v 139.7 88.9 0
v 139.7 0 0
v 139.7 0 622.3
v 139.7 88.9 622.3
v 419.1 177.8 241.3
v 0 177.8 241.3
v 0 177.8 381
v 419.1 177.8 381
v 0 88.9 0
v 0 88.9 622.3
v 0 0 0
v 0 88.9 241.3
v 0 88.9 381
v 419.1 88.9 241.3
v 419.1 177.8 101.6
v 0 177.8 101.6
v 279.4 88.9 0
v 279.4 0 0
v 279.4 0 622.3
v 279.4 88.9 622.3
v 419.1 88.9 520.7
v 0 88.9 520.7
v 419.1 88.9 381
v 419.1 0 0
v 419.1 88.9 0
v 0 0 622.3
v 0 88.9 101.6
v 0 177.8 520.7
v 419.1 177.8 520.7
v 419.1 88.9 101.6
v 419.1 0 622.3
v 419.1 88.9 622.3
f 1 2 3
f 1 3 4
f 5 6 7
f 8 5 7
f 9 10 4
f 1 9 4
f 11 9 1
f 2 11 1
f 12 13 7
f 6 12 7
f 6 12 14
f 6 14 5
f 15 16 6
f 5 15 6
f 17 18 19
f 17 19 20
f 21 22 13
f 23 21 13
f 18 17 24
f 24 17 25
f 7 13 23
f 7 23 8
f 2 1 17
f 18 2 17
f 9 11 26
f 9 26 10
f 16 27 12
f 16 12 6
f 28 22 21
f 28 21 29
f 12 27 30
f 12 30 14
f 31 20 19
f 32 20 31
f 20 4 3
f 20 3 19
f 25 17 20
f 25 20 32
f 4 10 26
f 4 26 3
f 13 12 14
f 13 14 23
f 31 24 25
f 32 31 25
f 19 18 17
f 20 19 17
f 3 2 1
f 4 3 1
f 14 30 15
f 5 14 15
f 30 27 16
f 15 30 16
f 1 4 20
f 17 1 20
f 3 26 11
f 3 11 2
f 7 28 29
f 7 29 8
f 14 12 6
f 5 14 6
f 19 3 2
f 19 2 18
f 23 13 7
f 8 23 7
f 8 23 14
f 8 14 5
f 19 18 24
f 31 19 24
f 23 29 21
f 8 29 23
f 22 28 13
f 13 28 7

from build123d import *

# Parameters (mm, degrees)
SKETCH1_W             = 139.7
SKETCH1_H             = 88.9
BOSS_EXTRUDE1_DEPTH   = 622.3
BOSS_EXTRUDE1_2_DEPTH = 622.3
SKETCH1_4_W           = 139.7
SKETCH1_4_H           = 88.9
BOSS_EXTRUDE2_DEPTH   = 622.3
SKETCH2_W             = 139.7
SKETCH2_H             = 88.9
BOSS_EXTRUDE3_DEPTH   = 419.1
LPATTERN1_OUTLINE_W   = 88.9
LPATTERN1_OUTLINE_H   = 139.7
LPATTERN1_DEPTH       = 419.1
LPATTERN1_2_OUTLINE_W = 88.9
LPATTERN1_2_OUTLINE_H = 139.7
LPATTERN1_2_DEPTH     = 419.1


# Read off the part's stored shape, not the designer's step: LPattern1
with BuildPart() as part:
    # Sketch1 → Boss-Extrude1 (new body)
    with BuildSketch(Plane.XY):
        with Locations((69.85, 44.45)):
            Rectangle(SKETCH1_W, SKETCH1_H)
    extrude(amount=BOSS_EXTRUDE1_DEPTH)


with BuildPart() as body_2:
    # Sketch1 → Boss-Extrude1 2 (new body)
    with BuildSketch(Plane.XY):
        with Locations((349.25, 44.45)):
            Rectangle(SKETCH1_W, SKETCH1_H)
    extrude(amount=BOSS_EXTRUDE1_2_DEPTH)


with BuildPart() as body_3:
    # Sketch1<4> → Boss-Extrude2 (new body)
    with BuildSketch(Plane.XY):
        with Locations((209.55, 44.45)):
            Rectangle(SKETCH1_4_W, SKETCH1_4_H)
    extrude(amount=BOSS_EXTRUDE2_DEPTH)


with BuildPart() as body_4:
    # Sketch2 → Boss-Extrude3 (new body)
    with BuildSketch(Plane(origin=(0, 0, 0), x_dir=(0, 0, -1), z_dir=(1, 0, 0))):
        with Locations((-450.85, 133.35)):
            Rectangle(SKETCH2_W, SKETCH2_H)
    extrude(amount=BOSS_EXTRUDE3_DEPTH)


with BuildPart() as body_5:
    # LPattern1 outline → LPattern1 (new body)
    with BuildSketch(Plane.YZ):
        with Locations((133.35, 171.45)):
            Rectangle(LPATTERN1_OUTLINE_W, LPATTERN1_OUTLINE_H)
    extrude(amount=LPATTERN1_DEPTH)


with BuildPart() as body_6:
    # LPattern1 2 outline → LPattern1 2 (new body)
    with BuildSketch(Plane.YZ):
        with Locations((133.35, 311.15)):
            Rectangle(LPATTERN1_2_OUTLINE_W, LPATTERN1_2_OUTLINE_H)
    extrude(amount=LPATTERN1_2_DEPTH)


solid = Compound([part.part, body_2.part, body_3.part, body_4.part, body_5.part, body_6.part])
